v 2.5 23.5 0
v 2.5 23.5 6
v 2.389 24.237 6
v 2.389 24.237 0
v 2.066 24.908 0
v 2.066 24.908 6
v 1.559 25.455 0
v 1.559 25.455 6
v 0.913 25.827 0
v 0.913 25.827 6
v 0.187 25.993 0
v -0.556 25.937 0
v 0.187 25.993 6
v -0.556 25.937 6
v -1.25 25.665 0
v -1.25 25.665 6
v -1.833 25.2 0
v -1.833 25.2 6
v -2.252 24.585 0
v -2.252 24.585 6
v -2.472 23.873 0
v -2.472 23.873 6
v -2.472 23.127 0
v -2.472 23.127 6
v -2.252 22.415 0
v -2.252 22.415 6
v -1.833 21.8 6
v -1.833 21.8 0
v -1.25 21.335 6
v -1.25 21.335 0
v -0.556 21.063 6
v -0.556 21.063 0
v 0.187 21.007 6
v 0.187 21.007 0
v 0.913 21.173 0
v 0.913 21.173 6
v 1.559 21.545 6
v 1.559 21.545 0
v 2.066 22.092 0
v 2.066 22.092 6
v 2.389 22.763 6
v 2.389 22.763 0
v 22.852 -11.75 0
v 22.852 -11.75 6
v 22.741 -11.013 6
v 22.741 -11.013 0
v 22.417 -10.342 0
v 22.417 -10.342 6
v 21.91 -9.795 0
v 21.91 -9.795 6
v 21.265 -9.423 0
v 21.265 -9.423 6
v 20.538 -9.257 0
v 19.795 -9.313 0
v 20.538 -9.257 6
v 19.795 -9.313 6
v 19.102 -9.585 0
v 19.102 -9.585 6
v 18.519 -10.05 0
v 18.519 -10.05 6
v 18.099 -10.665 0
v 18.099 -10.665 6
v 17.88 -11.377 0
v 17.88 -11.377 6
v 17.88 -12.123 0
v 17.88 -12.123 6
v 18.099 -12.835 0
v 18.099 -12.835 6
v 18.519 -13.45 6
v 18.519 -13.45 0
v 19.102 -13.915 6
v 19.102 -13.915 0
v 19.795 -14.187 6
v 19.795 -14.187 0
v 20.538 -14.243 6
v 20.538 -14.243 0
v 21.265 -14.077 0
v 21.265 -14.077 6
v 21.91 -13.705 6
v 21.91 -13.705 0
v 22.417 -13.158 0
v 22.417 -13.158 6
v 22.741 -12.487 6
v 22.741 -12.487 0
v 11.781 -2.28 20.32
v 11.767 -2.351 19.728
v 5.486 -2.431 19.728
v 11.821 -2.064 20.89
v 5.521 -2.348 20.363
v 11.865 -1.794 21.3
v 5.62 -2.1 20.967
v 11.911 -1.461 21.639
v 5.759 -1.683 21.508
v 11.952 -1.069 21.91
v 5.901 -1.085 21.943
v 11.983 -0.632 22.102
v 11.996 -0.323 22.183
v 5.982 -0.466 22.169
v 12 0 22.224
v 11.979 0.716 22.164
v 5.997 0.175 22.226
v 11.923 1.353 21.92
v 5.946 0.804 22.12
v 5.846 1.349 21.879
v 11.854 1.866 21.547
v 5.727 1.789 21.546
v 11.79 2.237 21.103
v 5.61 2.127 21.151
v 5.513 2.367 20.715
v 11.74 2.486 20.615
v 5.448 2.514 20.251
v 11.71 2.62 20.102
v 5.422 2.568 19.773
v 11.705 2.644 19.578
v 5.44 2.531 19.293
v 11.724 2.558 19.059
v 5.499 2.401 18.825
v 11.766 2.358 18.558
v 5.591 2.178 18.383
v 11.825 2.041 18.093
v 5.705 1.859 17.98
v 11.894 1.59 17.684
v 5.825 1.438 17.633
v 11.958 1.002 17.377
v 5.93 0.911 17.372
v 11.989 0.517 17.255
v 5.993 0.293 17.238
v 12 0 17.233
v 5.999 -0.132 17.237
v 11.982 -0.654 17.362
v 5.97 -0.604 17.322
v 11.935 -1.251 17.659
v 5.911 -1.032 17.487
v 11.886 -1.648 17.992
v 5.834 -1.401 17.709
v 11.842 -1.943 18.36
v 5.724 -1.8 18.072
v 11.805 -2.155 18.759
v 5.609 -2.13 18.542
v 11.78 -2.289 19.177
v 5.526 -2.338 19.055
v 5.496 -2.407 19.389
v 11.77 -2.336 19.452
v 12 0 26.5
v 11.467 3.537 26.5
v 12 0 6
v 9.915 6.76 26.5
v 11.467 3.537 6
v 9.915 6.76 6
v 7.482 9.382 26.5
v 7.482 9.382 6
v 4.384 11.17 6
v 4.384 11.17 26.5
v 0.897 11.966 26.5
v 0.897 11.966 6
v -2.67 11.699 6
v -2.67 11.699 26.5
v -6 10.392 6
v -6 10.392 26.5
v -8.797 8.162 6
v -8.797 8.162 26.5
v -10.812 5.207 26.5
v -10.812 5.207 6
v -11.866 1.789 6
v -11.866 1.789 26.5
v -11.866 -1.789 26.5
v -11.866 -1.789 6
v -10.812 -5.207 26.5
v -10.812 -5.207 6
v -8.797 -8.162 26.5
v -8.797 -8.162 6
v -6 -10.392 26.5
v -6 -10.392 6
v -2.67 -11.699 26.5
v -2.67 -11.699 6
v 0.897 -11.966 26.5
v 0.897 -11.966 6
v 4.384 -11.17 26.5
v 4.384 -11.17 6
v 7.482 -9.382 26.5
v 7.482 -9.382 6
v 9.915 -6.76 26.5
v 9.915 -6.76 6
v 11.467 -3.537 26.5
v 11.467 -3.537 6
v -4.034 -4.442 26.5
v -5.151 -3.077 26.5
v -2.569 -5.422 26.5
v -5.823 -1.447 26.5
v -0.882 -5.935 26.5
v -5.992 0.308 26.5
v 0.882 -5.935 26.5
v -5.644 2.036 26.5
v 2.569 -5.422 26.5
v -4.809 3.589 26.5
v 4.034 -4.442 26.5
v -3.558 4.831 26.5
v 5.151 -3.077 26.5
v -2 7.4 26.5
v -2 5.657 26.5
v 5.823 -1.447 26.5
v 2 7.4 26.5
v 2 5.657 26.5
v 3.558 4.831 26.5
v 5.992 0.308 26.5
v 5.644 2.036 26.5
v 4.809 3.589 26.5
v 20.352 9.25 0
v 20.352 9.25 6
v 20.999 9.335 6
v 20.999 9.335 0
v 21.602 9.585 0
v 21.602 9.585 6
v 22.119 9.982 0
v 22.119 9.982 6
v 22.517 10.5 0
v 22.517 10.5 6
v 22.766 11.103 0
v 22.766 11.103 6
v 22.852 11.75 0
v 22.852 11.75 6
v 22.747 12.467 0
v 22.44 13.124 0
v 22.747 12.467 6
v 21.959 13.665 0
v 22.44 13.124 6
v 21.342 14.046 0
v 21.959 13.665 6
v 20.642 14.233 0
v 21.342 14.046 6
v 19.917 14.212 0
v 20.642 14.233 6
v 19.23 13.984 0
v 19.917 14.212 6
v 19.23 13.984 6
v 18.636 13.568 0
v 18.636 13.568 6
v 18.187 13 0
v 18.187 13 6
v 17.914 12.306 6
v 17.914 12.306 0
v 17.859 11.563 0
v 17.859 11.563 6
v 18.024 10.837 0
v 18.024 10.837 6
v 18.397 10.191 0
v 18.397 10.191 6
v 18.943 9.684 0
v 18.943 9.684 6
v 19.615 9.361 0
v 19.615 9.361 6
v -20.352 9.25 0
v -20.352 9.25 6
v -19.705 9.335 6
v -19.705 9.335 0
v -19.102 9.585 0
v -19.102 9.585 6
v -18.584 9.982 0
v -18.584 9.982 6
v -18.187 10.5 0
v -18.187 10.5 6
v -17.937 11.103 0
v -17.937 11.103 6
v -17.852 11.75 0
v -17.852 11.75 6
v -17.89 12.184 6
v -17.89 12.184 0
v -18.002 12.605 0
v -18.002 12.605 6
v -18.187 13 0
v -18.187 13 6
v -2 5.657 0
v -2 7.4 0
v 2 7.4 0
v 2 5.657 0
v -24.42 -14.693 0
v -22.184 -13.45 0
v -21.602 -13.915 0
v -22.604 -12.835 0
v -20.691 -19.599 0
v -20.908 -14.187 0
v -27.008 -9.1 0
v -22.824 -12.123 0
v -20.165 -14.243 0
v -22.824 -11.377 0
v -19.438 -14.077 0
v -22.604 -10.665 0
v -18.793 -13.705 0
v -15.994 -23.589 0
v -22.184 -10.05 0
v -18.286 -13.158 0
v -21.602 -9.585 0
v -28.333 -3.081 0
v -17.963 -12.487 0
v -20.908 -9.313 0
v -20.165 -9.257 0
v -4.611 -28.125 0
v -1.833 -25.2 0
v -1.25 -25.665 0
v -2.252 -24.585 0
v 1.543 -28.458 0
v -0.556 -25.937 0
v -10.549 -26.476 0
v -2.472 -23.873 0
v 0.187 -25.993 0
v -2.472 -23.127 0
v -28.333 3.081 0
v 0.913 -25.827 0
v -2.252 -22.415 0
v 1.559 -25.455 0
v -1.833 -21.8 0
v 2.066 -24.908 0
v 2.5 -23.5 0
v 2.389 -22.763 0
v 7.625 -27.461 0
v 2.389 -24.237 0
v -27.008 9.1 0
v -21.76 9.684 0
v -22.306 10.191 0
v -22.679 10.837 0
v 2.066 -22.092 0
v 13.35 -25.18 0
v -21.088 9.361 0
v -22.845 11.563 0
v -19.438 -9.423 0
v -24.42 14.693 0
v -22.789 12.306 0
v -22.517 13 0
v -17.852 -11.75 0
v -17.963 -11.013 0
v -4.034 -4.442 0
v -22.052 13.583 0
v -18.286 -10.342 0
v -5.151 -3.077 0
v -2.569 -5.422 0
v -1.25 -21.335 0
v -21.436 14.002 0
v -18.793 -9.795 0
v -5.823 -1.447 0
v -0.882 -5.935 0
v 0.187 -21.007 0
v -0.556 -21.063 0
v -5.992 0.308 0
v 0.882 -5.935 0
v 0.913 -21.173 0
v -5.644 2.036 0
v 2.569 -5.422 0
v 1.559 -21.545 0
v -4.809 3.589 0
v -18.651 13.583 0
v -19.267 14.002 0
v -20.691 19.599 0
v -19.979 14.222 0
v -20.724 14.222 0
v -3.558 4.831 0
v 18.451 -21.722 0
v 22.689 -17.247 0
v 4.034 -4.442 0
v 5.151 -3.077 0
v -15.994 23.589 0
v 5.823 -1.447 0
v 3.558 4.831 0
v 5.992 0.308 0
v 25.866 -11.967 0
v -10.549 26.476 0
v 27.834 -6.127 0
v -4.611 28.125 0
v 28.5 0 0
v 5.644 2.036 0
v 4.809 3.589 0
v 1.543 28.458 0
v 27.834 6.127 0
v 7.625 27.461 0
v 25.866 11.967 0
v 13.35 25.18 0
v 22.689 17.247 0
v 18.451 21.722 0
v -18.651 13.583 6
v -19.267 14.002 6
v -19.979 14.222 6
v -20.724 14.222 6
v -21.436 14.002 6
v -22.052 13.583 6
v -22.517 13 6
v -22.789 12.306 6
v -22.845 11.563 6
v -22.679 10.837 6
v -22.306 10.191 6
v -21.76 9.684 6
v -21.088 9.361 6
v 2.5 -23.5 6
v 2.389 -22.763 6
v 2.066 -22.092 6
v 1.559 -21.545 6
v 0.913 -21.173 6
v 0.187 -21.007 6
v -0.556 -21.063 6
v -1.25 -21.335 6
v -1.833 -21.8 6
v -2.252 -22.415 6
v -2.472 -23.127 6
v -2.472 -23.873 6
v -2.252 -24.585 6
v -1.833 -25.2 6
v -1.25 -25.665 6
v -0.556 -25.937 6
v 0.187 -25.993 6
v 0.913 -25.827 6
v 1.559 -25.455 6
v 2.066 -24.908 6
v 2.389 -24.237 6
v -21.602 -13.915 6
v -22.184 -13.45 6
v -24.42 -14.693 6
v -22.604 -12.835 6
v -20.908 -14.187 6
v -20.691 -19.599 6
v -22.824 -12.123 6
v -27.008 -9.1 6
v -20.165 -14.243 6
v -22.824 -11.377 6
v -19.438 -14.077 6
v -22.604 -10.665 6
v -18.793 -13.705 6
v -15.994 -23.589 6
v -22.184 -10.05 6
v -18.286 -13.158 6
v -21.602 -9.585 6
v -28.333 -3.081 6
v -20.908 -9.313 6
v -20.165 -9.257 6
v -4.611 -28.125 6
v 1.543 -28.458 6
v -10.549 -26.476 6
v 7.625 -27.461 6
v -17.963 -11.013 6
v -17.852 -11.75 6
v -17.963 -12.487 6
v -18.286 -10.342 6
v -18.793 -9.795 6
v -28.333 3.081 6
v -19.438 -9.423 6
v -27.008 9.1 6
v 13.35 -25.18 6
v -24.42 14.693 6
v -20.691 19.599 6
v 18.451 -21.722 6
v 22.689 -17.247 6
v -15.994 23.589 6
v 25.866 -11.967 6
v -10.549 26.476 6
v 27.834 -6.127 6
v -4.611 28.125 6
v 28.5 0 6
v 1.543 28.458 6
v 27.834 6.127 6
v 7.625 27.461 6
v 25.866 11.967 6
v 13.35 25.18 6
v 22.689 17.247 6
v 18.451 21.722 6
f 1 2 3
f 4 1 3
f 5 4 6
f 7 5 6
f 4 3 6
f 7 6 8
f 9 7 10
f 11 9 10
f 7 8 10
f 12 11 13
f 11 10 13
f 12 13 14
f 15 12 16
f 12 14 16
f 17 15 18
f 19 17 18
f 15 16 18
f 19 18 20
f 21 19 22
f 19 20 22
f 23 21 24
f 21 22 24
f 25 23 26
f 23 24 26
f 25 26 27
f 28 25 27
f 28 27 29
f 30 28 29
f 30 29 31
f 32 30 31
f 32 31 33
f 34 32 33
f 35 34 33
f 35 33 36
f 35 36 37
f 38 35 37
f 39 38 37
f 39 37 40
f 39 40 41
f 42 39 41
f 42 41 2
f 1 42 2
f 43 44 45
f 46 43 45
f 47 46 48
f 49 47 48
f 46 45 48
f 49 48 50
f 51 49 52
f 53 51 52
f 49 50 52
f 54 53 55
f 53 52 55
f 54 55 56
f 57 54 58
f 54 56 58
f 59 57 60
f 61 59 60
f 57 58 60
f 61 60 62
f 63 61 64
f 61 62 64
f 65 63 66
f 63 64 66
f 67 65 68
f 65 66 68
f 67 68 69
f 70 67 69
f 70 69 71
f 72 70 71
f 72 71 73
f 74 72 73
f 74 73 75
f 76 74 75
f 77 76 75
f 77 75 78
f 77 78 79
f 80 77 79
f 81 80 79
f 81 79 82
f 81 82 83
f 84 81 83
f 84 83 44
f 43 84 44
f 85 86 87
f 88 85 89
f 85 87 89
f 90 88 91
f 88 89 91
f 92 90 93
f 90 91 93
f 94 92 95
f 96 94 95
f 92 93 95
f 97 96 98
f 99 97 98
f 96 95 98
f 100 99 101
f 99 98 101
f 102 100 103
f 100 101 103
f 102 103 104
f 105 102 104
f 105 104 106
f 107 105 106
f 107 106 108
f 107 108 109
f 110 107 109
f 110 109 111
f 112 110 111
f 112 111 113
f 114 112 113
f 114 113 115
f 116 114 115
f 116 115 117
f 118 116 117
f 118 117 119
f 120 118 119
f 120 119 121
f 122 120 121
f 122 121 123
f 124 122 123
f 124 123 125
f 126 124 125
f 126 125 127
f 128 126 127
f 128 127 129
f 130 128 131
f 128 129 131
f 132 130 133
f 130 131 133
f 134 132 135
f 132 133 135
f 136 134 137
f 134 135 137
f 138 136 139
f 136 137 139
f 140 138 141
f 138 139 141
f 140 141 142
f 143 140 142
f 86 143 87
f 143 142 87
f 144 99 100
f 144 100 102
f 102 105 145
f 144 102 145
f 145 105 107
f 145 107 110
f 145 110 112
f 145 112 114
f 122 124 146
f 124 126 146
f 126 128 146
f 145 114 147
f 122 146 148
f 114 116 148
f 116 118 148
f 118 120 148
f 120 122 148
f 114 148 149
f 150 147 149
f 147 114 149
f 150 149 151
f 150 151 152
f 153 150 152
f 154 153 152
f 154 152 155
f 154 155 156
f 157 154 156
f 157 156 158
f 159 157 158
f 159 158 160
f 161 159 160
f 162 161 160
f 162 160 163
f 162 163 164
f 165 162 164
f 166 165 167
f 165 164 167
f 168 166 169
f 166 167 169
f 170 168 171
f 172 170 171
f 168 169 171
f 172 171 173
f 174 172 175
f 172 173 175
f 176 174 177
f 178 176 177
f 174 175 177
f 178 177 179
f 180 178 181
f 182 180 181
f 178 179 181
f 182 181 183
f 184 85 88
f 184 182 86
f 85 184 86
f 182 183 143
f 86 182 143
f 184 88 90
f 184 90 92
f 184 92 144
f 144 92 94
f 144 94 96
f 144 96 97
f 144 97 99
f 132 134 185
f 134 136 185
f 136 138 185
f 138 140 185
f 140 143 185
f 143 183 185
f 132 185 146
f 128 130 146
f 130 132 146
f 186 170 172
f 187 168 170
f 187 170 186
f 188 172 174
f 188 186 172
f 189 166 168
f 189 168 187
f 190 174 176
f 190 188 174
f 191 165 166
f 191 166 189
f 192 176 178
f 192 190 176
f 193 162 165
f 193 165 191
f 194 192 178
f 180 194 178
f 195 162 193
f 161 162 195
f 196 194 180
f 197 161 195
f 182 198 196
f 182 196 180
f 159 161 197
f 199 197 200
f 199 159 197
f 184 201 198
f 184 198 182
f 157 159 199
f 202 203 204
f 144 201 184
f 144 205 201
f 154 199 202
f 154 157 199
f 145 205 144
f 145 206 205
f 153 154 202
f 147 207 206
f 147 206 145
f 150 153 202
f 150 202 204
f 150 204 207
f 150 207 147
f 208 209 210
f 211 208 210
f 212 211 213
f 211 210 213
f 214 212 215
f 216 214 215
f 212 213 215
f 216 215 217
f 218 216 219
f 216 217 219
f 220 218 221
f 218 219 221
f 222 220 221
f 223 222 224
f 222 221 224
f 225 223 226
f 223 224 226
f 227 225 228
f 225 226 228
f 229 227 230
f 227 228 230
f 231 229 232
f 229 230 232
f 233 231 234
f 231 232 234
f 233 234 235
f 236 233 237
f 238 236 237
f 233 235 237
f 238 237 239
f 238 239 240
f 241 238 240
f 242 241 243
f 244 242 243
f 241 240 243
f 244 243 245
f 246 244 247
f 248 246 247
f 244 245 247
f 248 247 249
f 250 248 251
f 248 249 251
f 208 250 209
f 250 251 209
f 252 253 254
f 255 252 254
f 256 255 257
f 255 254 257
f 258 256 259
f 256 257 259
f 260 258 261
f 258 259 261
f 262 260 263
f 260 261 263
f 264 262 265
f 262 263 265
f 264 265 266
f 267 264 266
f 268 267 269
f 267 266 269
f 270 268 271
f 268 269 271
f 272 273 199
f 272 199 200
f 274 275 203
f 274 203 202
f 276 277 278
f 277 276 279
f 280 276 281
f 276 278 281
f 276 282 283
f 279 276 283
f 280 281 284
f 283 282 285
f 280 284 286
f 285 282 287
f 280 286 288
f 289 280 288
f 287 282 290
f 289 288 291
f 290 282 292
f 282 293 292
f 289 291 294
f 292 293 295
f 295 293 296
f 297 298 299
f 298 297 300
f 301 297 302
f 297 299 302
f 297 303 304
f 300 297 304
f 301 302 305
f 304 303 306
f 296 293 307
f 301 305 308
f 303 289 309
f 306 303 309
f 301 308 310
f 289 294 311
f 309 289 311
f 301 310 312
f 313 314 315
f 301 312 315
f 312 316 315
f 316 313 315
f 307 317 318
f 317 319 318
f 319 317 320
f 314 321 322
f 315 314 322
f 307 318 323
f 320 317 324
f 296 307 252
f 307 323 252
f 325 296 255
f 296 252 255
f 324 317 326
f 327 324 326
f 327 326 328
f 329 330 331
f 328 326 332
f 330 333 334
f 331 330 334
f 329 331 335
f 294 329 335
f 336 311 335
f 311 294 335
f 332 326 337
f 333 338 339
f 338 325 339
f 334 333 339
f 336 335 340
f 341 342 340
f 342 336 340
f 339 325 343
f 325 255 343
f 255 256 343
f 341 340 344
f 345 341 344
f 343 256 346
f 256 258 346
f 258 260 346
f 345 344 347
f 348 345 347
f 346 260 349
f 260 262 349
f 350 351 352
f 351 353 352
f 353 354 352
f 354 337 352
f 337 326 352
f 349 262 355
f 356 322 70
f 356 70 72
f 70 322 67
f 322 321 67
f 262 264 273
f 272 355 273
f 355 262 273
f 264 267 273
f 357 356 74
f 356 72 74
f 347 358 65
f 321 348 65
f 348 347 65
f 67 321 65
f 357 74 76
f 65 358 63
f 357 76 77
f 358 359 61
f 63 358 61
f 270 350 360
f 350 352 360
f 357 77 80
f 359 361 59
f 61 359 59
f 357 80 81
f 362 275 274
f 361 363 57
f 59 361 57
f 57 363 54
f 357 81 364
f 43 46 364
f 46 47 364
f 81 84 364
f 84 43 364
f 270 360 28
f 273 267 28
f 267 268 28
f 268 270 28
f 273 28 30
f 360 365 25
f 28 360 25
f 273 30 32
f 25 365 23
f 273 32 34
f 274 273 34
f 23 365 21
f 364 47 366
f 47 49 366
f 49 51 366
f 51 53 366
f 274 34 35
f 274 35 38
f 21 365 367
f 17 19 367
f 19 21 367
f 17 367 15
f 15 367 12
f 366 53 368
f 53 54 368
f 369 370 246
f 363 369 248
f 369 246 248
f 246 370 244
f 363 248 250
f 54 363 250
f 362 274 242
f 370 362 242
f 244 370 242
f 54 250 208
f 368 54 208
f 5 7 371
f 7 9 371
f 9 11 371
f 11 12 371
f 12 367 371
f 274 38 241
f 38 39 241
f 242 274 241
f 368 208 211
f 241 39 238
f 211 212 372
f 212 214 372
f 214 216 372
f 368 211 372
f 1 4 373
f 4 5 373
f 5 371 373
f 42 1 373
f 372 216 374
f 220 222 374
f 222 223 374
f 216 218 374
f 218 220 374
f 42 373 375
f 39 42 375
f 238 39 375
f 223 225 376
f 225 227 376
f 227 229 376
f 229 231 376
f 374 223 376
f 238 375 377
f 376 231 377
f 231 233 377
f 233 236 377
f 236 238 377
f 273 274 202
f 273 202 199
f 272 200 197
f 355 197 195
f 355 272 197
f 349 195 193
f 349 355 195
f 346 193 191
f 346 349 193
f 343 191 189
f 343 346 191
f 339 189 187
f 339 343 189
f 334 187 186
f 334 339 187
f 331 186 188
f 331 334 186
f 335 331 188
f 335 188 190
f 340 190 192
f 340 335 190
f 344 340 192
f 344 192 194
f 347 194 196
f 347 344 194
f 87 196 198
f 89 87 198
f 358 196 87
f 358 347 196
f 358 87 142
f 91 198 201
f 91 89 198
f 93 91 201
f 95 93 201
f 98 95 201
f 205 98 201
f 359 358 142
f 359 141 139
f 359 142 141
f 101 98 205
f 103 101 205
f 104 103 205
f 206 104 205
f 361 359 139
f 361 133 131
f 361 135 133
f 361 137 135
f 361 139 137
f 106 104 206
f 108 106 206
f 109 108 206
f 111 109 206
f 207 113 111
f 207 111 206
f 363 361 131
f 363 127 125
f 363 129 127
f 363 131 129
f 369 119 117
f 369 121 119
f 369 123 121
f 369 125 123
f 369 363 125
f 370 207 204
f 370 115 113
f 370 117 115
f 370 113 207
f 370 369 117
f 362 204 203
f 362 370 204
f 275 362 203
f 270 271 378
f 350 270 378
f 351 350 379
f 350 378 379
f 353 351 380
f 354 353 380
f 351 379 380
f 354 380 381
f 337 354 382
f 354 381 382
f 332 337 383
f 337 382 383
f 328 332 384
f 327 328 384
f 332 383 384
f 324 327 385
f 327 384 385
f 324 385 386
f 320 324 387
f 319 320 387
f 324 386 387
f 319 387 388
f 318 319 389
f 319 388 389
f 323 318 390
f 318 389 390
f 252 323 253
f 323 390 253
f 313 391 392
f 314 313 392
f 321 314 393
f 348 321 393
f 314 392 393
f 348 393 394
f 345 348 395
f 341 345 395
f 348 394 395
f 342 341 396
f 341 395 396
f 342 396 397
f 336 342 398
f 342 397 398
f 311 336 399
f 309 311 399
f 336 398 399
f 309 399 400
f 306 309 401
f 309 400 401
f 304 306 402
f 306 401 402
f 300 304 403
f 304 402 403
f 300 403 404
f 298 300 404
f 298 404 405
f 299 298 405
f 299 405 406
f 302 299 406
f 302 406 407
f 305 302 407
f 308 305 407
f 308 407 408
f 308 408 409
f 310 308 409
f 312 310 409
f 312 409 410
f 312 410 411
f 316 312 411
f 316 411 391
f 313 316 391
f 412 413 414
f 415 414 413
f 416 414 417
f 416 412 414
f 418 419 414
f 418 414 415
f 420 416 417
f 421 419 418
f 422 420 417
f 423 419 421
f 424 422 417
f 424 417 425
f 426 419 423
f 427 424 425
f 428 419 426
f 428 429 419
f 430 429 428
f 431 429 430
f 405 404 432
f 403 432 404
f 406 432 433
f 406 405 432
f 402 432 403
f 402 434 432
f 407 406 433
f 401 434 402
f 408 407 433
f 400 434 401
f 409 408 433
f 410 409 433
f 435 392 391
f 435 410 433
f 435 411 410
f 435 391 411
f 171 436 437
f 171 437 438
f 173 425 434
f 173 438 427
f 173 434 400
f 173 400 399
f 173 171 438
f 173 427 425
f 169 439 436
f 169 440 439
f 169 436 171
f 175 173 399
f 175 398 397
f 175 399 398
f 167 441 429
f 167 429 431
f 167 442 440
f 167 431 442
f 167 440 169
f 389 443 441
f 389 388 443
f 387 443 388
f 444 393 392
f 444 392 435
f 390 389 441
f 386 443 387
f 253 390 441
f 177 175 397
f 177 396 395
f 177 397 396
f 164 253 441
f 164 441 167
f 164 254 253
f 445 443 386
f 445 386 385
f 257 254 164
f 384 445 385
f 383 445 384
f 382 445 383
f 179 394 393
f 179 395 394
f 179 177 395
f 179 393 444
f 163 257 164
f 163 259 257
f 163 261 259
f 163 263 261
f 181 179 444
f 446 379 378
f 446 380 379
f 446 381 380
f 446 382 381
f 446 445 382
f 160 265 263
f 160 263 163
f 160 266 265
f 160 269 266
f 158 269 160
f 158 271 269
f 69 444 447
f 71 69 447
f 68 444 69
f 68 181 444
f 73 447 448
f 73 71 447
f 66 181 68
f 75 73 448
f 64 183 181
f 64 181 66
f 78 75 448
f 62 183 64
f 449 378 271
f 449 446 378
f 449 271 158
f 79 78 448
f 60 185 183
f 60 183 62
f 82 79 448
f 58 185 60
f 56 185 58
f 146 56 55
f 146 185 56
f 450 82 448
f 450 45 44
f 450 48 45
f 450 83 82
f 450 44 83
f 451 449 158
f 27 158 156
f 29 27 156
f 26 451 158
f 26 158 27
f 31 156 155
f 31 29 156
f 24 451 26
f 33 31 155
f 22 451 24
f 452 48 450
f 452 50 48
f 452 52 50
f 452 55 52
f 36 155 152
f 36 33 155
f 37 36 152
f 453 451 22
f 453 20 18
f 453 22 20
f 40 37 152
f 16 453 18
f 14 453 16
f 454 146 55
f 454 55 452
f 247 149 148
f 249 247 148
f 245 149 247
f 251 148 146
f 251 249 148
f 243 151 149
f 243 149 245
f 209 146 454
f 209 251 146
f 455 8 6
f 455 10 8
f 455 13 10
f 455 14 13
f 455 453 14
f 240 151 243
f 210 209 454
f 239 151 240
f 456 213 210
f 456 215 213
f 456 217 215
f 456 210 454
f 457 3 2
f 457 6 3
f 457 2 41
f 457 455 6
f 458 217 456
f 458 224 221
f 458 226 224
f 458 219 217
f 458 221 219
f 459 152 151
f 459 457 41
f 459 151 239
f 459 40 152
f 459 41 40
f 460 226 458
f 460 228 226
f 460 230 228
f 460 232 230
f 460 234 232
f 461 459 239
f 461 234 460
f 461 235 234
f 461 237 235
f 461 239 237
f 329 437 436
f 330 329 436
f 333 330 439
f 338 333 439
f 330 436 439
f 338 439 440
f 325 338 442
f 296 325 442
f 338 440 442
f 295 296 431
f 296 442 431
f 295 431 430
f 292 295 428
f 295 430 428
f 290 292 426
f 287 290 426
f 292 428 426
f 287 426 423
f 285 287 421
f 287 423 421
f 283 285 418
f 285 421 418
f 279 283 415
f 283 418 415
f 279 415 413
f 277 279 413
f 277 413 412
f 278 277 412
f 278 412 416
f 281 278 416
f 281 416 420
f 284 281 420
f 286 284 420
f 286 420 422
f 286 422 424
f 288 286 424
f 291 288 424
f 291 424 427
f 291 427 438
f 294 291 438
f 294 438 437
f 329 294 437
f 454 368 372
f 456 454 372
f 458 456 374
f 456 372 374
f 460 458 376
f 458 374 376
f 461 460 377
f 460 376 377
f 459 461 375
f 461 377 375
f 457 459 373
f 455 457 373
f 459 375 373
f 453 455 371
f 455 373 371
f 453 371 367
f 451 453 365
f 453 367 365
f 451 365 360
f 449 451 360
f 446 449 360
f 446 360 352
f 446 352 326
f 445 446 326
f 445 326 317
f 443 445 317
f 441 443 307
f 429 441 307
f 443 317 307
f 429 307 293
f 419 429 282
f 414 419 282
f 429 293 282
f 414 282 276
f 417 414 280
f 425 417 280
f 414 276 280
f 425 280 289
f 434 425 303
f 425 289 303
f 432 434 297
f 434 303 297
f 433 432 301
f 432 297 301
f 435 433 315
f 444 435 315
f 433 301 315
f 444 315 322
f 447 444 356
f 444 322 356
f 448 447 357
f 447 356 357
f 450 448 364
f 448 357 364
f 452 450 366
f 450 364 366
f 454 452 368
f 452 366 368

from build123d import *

# Parameters (mm, degrees)
SKETCH_1_R              = 28.5
SKETCH_1_R_2            = 6
EXTRUDE_1_DEPTH         = 6
SKETCH_2_R              = 12
SKETCH_2_R_2            = 6
EXTRUDE_2_DEPTH         = 20.5
HOLE_WIZARD_1_4_1_D     = 4.999999906
HOLE_WIZARD_1_4_1_DEPTH = 10
SKETCH_5_R              = 2.5
CUT_EXTRUDE_1_DEPTH     = 30
CUT_EXTRUDE_START       = -100
CUT_EXTRUDE_2_DEPTH     = 100


with BuildPart() as part:
    # ｽｹｯﾁ1 → ﾎﾞｽ - 押し出し1 (new body)
    with BuildSketch(Plane.XY):
        Circle(SKETCH_1_R)
        Circle(SKETCH_1_R_2, mode=Mode.SUBTRACT)
    extrude(amount=EXTRUDE_1_DEPTH)

    # ｽｹｯﾁ2 → ﾎﾞｽ - 押し出し2 (add)
    with BuildSketch(Plane.XY.offset(6)):
        Circle(SKETCH_2_R)
        Circle(SKETCH_2_R_2, mode=Mode.SUBTRACT)
    extrude(amount=EXTRUDE_2_DEPTH)

    # 1/4 すきま穴1
    with Locations(Plane(origin=(11.999037225, 0.152005526, 19.728327371), x_dir=(-0.012667127201, 0.999919768726, 0), z_dir=(0.999919768726, 0.012667127201, 0))):
        with Locations((0, 0)):
            Hole(HOLE_WIZARD_1_4_1_D / 2, depth=HOLE_WIZARD_1_4_1_DEPTH)

    # ｽｹｯﾁ5 → ｶｯﾄ - 押し出し1 (cut)
    with BuildSketch(Plane.XY.offset(6)):
        with BuildLine():
            ThreePointArc((-17.851596989, 11.75), (-17.936782423, 12.397047613), (-18.186533479, 13))
            Line((-18.186533479, 13), (-20.351596989, 11.75))
            Line((-20.351596989, 11.75), (-20.351596989, 9.25))
            ThreePointArc((-20.351596989, 9.25), (-18.583830036, 9.982233047), (-17.851596989, 11.75))
        make_face()
        with BuildLine():
            Line((-20.351596989, 11.75), (-18.186533479, 13))
            ThreePointArc((-18.186533479, 13), (-22.516660498, 13), (-20.351596989, 9.25))
            Line((-20.351596989, 9.25), (-20.351596989, 11.75))
        make_face()
        with BuildLine():
            ThreePointArc((22.851596989, 11.75), (20.998644602, 14.164814566), (18.186533479, 13))
            Line((18.186533479, 13), (20.351596989, 11.75))
            Line((20.351596989, 11.75), (20.351596989, 9.25))
            ThreePointArc((20.351596989, 9.25), (22.119363942, 9.982233047), (22.851596989, 11.75))
        make_face()
        with BuildLine():
            Line((20.351596989, 11.75), (18.186533479, 13))
            ThreePointArc((18.186533479, 13), (18.186533479, 10.5), (20.351596989, 9.25))
            Line((20.351596989, 9.25), (20.351596989, 11.75))
        make_face()
        with Locations((0, 23.5)):
            Circle(SKETCH_5_R)
        with Locations((-20.351596989, -11.75)):
            Circle(SKETCH_5_R)
        with Locations((0, -23.5)):
            Circle(SKETCH_5_R)
        with Locations((20.351596989, -11.75)):
            Circle(SKETCH_5_R)
    extrude(amount=-CUT_EXTRUDE_1_DEPTH, mode=Mode.SUBTRACT)

    # ｽｹｯﾁ6 → ｶｯﾄ - 押し出し2 (cut)
    with BuildSketch(Plane.XY.offset(26.5).offset(CUT_EXTRUDE_START)):
        with BuildLine():
            Line((-2, 7.4), (-2, 5.656854249))
            ThreePointArc((-2, 5.656854249), (0, 6), (2, 5.656854249))
            Line((2, 5.656854249), (2, 7.4))
            Line((2, 7.4), (-2, 7.4))
        make_face()
    extrude(amount=CUT_EXTRUDE_2_DEPTH, mode=Mode.SUBTRACT)


solid = part.part
